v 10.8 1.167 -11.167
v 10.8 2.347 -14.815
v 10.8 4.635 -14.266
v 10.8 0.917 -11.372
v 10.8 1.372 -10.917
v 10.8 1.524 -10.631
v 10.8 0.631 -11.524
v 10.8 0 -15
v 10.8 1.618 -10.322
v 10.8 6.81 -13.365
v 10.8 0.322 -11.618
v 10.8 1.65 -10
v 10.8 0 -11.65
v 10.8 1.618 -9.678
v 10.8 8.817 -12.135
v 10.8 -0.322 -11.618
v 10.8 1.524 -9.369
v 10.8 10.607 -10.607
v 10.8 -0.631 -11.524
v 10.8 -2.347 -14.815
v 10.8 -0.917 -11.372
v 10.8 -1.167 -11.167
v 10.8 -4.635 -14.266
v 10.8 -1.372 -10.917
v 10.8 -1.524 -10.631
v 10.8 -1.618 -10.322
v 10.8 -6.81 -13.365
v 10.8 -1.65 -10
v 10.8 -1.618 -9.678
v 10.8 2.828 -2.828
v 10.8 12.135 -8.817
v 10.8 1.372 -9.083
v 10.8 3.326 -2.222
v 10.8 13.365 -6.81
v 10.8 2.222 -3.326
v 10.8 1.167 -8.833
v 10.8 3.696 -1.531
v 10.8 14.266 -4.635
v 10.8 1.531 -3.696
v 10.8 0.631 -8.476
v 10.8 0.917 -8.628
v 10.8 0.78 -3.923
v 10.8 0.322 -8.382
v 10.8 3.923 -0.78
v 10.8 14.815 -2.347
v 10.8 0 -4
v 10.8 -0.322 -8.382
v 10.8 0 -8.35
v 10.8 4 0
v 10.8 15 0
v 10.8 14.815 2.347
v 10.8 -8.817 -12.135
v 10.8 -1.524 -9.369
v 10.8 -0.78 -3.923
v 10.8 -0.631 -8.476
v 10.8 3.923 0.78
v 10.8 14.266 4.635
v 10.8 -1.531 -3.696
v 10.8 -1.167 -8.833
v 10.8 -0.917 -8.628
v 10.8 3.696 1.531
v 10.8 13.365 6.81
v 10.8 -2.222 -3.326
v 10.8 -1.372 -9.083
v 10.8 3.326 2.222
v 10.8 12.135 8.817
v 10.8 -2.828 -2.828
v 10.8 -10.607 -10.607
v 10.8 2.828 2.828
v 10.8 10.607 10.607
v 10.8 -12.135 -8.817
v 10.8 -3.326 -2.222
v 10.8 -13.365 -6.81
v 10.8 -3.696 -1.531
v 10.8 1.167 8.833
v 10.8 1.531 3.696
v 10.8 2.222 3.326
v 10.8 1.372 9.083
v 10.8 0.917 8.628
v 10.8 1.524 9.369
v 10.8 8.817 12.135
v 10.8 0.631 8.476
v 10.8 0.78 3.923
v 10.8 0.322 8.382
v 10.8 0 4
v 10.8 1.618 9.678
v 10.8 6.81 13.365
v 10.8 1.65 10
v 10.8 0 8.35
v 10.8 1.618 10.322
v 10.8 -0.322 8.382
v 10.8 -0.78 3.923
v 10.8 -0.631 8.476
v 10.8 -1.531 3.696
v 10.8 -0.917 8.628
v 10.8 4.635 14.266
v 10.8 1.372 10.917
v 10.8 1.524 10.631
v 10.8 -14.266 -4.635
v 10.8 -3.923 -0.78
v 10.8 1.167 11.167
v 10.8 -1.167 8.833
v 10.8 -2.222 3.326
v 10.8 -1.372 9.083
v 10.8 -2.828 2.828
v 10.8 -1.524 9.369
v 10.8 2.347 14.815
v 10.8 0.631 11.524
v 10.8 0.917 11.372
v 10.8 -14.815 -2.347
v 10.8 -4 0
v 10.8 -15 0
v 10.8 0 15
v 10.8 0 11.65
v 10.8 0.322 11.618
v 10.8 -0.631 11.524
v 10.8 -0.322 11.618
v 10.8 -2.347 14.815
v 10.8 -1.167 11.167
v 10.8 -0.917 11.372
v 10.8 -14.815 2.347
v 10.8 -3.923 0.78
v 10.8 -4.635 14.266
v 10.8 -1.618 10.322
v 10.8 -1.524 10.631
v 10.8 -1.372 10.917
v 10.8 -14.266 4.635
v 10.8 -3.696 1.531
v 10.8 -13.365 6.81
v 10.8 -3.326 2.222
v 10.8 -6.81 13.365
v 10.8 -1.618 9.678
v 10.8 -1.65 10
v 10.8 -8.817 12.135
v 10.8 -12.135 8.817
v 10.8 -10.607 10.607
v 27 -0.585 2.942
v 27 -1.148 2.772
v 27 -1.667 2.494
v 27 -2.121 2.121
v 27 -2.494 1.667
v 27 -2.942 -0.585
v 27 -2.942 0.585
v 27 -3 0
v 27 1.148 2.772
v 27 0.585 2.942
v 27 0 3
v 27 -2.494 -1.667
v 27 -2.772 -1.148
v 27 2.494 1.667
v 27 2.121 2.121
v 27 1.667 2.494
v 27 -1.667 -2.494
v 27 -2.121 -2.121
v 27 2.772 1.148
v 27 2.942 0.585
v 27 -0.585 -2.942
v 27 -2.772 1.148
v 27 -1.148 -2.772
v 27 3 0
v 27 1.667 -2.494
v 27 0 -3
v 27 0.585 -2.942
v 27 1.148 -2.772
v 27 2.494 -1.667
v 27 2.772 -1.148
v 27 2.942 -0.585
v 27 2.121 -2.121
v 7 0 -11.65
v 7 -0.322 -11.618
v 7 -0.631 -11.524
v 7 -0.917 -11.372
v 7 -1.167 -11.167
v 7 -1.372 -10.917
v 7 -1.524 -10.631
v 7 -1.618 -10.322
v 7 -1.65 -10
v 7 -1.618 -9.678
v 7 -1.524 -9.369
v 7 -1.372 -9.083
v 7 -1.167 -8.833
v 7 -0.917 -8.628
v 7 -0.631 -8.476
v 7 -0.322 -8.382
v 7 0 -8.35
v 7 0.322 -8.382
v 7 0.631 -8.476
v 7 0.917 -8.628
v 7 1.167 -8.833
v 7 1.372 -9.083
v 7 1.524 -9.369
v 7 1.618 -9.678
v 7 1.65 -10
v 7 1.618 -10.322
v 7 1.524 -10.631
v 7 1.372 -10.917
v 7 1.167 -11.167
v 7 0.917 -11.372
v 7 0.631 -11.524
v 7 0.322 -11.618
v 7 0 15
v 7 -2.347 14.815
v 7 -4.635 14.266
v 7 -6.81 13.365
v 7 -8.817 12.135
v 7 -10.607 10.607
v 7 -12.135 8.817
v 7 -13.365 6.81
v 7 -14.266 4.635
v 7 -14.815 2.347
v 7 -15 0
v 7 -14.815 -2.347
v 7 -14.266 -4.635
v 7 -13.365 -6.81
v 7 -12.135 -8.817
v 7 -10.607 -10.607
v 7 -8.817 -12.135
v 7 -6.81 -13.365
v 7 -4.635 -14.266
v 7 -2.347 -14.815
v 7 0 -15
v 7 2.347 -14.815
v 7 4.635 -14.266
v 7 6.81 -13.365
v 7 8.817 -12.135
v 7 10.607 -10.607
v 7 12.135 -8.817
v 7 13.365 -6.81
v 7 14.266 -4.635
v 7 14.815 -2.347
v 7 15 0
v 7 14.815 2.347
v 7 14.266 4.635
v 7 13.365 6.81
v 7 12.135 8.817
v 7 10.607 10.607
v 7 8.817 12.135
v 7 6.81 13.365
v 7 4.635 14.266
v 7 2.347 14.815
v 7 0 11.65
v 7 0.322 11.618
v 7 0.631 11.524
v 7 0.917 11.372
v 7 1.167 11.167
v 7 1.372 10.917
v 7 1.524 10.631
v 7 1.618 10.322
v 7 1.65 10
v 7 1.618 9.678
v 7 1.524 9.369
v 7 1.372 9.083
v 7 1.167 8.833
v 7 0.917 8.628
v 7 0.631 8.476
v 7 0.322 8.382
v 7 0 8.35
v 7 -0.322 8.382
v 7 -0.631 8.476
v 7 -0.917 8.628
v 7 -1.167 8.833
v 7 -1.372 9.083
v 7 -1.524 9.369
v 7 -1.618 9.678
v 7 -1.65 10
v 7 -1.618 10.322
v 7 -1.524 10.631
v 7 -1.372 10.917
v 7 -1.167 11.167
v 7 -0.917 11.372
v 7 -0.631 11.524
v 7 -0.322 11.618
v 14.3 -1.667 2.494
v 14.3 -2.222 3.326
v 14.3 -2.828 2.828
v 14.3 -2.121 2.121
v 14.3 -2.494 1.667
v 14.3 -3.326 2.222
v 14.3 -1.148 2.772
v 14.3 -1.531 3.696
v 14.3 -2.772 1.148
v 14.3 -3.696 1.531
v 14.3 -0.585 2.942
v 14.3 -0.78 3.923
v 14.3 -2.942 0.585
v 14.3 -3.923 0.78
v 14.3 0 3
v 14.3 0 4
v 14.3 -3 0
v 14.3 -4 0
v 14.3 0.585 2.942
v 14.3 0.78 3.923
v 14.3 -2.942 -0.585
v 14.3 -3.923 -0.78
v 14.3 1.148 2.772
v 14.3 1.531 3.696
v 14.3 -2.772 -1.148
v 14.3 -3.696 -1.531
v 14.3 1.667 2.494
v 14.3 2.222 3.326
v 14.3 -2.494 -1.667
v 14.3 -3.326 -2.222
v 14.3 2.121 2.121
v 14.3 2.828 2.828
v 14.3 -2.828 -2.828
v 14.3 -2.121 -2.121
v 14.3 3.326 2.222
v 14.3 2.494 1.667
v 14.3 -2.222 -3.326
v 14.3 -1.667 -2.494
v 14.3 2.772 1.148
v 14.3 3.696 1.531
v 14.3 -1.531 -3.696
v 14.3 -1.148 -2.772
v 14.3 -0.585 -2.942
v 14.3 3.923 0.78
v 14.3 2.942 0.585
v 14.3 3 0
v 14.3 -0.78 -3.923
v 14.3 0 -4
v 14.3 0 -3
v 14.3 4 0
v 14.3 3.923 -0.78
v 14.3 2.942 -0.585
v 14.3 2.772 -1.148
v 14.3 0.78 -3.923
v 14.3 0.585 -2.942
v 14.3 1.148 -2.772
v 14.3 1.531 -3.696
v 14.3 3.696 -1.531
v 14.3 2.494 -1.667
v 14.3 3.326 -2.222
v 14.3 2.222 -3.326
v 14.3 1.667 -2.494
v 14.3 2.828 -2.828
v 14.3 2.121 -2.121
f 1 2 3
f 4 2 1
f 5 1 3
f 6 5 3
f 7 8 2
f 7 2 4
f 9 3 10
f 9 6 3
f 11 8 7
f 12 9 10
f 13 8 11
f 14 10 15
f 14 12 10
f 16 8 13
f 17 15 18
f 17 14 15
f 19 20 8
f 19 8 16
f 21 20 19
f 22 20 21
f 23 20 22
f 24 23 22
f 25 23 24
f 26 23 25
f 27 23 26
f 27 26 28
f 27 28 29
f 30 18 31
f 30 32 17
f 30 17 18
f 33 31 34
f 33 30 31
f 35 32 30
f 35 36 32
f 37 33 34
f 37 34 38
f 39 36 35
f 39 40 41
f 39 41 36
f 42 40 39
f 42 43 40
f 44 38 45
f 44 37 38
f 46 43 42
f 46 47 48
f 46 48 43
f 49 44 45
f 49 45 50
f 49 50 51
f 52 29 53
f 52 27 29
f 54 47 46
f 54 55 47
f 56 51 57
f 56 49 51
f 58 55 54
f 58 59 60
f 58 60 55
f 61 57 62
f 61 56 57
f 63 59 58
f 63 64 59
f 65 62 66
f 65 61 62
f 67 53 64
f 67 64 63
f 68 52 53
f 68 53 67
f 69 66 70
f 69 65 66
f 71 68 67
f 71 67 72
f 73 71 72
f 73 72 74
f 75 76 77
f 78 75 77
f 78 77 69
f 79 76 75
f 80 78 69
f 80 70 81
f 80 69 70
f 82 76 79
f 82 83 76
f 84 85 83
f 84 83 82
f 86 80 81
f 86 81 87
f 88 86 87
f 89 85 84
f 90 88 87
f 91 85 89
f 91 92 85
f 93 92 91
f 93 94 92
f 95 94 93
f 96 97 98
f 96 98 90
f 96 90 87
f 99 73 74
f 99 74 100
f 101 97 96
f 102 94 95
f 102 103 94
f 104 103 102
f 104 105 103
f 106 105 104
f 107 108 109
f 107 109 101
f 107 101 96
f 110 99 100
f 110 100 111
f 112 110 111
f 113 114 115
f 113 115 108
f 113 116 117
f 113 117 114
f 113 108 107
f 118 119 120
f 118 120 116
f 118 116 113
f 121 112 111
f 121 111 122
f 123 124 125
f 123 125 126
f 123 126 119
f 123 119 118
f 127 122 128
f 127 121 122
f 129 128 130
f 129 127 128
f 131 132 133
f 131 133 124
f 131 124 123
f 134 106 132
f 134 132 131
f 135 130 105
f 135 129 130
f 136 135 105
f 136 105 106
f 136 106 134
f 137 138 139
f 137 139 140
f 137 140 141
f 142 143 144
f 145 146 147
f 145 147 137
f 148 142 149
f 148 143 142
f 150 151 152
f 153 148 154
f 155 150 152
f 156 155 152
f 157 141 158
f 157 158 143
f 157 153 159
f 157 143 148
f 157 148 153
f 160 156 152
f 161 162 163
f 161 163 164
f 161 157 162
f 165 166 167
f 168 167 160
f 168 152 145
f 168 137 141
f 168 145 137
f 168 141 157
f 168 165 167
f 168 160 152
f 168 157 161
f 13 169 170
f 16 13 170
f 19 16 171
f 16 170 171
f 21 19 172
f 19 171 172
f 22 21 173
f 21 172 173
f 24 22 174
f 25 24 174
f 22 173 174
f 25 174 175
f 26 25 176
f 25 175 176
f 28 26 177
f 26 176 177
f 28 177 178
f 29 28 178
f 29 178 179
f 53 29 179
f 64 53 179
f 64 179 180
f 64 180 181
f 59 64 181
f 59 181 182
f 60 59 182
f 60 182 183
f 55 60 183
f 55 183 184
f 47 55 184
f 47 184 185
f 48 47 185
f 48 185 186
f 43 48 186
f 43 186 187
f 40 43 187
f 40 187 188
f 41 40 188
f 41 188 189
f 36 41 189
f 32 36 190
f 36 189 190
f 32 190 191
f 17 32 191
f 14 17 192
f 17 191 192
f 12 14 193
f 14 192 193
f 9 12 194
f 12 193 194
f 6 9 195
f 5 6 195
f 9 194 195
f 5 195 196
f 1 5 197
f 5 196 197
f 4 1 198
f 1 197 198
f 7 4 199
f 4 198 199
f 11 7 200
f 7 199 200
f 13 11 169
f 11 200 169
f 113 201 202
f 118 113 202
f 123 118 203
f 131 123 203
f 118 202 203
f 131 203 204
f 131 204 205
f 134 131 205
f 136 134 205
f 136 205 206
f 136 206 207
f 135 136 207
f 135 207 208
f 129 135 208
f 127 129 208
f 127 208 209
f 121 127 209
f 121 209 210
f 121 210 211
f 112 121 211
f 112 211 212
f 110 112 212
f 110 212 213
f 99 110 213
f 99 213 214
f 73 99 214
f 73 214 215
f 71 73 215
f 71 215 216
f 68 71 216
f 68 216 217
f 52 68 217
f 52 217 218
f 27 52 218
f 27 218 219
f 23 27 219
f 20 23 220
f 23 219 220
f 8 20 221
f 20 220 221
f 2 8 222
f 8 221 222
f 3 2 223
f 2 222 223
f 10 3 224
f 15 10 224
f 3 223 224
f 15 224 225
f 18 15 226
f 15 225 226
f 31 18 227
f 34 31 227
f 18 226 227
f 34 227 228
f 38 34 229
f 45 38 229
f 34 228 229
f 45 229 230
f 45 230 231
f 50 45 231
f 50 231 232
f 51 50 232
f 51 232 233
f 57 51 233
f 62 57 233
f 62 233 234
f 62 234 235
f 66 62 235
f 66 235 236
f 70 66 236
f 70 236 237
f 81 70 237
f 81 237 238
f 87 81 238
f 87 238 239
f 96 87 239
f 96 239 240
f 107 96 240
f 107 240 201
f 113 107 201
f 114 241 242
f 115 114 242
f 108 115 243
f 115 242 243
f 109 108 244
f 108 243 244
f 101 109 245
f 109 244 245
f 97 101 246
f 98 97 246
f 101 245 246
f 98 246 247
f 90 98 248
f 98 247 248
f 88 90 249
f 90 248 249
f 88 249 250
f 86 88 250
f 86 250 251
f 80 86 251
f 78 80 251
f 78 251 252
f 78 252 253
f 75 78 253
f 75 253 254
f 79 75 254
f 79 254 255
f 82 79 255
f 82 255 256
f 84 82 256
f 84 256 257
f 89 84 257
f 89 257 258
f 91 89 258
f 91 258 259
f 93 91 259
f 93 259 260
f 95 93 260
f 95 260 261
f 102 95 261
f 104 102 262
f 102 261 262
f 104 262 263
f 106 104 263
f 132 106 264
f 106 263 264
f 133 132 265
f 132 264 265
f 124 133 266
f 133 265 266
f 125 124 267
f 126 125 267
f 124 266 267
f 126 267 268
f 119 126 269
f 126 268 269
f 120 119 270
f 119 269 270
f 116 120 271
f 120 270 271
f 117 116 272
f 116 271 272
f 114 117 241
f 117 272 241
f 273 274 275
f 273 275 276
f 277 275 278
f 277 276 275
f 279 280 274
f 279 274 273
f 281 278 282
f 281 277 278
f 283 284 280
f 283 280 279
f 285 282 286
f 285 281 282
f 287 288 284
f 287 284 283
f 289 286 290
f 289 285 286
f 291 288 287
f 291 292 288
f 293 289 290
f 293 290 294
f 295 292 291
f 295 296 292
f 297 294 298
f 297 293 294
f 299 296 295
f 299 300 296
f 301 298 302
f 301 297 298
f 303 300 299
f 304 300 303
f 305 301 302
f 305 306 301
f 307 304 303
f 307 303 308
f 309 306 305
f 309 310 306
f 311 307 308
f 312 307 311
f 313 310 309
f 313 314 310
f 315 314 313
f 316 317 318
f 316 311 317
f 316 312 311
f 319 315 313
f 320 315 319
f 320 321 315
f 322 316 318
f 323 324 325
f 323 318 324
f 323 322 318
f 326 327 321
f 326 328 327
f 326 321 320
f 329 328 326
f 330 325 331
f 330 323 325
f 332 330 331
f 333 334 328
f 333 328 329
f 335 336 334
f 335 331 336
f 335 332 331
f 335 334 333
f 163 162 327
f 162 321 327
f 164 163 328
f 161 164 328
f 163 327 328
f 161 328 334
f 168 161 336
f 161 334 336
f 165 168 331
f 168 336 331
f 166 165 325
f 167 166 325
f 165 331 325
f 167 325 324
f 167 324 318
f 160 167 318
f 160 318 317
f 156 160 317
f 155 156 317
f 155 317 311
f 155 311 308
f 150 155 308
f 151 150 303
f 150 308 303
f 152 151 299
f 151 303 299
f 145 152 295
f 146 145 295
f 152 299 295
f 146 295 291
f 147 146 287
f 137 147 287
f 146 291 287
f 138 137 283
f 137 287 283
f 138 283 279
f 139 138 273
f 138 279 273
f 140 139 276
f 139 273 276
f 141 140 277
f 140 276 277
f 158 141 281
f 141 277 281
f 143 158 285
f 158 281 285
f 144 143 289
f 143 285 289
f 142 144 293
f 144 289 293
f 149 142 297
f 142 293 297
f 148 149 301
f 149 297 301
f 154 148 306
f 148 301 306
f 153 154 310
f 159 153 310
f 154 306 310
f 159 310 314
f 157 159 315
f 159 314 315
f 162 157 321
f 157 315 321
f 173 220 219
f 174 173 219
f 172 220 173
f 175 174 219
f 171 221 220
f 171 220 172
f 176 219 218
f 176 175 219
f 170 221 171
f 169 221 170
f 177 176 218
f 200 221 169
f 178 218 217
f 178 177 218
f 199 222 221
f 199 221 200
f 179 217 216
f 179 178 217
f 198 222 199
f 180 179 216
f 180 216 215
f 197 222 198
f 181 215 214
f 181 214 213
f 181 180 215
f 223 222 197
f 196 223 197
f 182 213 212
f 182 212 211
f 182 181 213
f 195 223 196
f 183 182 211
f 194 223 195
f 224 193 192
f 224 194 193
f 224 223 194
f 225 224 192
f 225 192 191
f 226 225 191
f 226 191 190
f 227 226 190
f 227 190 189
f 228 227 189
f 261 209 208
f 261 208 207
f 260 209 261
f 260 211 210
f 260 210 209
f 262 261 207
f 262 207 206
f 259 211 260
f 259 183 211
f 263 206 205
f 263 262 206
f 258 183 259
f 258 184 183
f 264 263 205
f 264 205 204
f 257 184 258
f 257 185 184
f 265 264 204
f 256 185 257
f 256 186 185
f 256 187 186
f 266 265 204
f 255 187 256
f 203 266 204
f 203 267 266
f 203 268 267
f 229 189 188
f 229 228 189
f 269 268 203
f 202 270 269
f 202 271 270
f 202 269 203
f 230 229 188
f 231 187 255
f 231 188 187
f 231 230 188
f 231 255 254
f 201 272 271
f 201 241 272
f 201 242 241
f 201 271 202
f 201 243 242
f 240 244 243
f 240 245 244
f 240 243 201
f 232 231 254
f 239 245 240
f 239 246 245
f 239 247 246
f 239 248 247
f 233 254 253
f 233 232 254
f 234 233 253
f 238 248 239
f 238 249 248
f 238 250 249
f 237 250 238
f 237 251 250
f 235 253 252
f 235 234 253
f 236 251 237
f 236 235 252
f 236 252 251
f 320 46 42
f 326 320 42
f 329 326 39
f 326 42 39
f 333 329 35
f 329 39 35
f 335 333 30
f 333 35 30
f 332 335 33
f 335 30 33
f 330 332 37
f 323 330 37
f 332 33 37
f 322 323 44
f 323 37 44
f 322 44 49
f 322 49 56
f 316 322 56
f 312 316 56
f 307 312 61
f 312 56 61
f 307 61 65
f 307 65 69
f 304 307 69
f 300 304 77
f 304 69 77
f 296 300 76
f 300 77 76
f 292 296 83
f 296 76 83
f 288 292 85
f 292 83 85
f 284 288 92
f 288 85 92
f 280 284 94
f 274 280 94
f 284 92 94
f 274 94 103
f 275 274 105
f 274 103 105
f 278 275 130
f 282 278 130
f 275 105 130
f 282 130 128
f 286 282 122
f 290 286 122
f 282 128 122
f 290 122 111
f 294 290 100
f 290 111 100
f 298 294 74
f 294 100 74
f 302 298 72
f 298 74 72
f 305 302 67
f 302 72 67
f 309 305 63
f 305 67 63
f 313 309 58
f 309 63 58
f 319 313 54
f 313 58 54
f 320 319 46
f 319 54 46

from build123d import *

# Parameters (mm, degrees)
SKETCH_1_R          = 15
EXTRUDE_1_DEPTH     = 10.8
SKETCH_2_R          = 4
EXTRUDE_2_DEPTH     = 3.5
SKETCH_3_R          = 3
EXTRUDE_3_DEPTH     = 5.8
SKETCH_4_R          = 1.65
CUT_EXTRUDE_1_DEPTH = 30.223449488
SKETCH_5_R          = 3
EXTRUDE_4_DEPTH     = 6.9
SKETCH_6_R          = 15
CUT_EXTRUDE_2_DEPTH = 7


with BuildPart() as part:
    # ｽｹｯﾁ1 → ﾎﾞｽ - 押し出し1 (new body)
    with BuildSketch(Plane(origin=(0, 0, 0), x_dir=(0, 0, -1), z_dir=(1, 0, 0))):
        with Locations(Location((0, 0, 0), (0, 0, 180))):
            Circle(SKETCH_1_R)
    extrude(amount=EXTRUDE_1_DEPTH)

    # ｽｹｯﾁ2 → ﾎﾞｽ - 押し出し2 (add)
    with BuildSketch(Plane(origin=(10.8, 0, 0), x_dir=(0, 0, -1), z_dir=(1, 0, 0))):
        Circle(SKETCH_2_R)
    extrude(amount=EXTRUDE_2_DEPTH)

    # ｽｹｯﾁ3 → ﾎﾞｽ - 押し出し3 (add)
    with BuildSketch(Plane(origin=(14.3, 0, 0), x_dir=(0, 0, -1), z_dir=(1, 0, 0))):
        Circle(SKETCH_3_R)
    extrude(amount=EXTRUDE_3_DEPTH)

    # ｽｹｯﾁ4 → ｶｯﾄ - 押し出し1 (cut, through all)
    with BuildSketch(Plane.ZY):
        with Locations((10, 0)):
            Circle(SKETCH_4_R)
        with Locations(Location((-10, 0, 0), (0, 0, 180))):
            Circle(SKETCH_4_R)
    extrude(amount=-CUT_EXTRUDE_1_DEPTH, mode=Mode.SUBTRACT)

    # ｽｹｯﾁ5 → ﾎﾞｽ - 押し出し4 (add)
    with BuildSketch(Plane(origin=(20.1, 0, 0), x_dir=(0, 0, -1), z_dir=(1, 0, 0))):
        Circle(SKETCH_5_R)
    extrude(amount=EXTRUDE_4_DEPTH)

    # ｽｹｯﾁ6 → ｶｯﾄ - 押し出し2 (cut)
    with BuildSketch(Plane.ZY):
        Circle(SKETCH_6_R)
    extrude(amount=-CUT_EXTRUDE_2_DEPTH, mode=Mode.SUBTRACT)


solid = part.part
